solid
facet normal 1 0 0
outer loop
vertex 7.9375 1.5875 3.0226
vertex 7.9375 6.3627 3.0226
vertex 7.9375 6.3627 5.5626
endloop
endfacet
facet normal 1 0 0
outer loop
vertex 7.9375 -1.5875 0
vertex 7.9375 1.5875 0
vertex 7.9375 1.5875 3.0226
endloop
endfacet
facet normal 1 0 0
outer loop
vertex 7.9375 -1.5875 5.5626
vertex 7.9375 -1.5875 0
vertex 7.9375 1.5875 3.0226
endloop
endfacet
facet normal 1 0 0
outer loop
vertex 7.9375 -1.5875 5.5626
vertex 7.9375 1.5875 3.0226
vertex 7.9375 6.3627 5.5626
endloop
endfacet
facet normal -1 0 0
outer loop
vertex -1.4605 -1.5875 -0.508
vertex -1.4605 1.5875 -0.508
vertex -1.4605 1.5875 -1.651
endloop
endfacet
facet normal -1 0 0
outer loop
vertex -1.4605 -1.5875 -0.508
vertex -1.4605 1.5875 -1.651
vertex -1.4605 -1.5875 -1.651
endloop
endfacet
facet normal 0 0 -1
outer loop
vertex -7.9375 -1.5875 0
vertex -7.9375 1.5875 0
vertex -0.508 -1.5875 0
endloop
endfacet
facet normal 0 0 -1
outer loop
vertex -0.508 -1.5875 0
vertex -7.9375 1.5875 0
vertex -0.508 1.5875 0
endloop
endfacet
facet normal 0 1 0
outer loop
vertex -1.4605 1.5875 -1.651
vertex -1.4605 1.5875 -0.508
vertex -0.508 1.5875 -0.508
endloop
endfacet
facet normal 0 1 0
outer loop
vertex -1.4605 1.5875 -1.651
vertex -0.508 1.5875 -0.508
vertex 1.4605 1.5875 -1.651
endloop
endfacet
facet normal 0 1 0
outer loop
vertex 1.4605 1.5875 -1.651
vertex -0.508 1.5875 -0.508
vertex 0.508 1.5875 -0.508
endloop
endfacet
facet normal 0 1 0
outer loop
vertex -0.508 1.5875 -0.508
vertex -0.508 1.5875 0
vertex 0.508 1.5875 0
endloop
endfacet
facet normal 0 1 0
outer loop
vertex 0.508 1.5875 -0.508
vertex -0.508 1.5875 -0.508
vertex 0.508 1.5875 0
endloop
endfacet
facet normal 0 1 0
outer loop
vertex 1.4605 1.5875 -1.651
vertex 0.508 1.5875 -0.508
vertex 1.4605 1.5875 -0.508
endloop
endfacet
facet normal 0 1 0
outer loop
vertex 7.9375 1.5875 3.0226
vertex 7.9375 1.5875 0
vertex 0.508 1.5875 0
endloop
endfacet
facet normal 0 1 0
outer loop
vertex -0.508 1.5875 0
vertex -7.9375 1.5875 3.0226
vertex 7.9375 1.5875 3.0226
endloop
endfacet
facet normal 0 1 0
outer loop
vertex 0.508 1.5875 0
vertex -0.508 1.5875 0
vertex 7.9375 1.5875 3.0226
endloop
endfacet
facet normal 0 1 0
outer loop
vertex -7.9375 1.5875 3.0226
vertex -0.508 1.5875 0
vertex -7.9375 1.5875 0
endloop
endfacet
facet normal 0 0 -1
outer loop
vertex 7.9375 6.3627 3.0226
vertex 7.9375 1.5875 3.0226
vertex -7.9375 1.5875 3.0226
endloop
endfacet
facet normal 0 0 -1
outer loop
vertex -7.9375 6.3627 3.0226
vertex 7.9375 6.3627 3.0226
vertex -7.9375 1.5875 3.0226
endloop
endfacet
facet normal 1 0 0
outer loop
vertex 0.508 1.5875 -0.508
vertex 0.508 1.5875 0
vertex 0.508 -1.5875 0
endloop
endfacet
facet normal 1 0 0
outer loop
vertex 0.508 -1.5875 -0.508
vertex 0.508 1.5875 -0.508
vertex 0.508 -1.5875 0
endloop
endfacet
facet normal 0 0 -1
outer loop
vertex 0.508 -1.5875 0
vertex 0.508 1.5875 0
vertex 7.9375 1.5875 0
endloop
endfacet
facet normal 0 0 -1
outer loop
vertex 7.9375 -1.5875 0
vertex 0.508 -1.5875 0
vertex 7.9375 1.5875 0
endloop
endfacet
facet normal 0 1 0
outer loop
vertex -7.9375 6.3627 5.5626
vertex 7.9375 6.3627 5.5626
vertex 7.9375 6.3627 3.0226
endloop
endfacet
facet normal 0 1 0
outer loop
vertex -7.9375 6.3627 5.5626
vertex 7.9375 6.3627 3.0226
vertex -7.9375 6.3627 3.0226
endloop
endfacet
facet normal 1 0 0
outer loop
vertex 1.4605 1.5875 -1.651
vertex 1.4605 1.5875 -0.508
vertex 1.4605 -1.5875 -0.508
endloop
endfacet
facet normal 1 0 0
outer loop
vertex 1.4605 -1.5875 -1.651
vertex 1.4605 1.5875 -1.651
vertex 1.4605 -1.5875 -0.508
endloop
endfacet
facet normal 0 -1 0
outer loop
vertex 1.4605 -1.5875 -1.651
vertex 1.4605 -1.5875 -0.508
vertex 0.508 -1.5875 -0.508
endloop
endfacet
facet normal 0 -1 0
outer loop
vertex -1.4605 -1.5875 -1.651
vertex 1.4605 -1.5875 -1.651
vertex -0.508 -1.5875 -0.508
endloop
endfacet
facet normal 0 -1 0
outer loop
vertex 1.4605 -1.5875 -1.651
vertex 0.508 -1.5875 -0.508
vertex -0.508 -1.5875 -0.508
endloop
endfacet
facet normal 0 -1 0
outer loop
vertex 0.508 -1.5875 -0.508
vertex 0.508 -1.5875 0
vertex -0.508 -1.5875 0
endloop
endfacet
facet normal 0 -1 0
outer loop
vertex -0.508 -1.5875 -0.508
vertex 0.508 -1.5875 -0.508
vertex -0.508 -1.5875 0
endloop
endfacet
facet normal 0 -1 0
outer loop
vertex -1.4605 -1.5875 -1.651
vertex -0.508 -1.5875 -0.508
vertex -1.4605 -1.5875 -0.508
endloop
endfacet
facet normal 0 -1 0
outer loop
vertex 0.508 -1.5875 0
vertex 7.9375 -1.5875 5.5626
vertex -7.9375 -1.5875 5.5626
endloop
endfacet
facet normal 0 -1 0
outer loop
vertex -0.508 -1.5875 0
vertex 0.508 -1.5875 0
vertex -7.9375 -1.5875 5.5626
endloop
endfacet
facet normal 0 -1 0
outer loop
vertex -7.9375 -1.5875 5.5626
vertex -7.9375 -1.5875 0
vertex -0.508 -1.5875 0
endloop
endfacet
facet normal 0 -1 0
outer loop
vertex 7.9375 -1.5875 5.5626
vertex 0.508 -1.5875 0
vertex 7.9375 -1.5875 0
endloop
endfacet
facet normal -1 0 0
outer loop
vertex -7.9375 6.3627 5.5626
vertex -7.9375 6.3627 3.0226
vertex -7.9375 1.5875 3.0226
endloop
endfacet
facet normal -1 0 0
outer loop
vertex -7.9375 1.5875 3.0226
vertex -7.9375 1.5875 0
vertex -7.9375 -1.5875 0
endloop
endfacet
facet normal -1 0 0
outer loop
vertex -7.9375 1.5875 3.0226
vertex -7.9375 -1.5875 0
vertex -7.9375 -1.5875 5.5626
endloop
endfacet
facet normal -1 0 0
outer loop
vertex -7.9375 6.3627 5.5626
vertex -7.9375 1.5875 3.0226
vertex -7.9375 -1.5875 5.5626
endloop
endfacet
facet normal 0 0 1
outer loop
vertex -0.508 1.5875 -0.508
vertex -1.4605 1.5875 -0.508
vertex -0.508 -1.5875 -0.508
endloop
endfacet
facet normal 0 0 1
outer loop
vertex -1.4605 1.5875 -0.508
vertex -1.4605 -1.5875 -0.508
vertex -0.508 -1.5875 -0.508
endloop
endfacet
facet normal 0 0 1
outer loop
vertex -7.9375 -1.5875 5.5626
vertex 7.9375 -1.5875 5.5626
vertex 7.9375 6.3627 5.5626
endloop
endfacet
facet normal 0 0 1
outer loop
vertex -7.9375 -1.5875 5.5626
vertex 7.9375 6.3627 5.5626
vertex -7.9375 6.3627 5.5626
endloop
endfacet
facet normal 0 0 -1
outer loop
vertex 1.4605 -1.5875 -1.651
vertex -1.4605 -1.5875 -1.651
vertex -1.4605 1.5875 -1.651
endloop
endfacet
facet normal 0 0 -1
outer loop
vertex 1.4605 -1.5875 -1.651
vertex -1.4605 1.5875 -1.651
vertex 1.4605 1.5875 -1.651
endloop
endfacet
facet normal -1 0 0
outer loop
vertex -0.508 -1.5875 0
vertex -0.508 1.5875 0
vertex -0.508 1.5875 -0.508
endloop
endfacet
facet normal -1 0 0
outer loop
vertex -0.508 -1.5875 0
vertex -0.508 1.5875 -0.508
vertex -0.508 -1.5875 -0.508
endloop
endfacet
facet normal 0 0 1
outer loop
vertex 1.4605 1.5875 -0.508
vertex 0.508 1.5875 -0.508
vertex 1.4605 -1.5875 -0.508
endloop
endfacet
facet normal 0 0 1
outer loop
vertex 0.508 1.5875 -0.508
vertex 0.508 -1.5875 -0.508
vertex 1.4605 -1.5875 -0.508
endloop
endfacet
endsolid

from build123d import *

# Parameters (mm, degrees)
F0_W     = 15.875
F0_H     = 3.175
F1_DEPTH = 5.5626
F2_W     = 15.875
F2_H     = 2.54
F3_DEPTH = 4.7752
F4_W     = 1.016
F4_H     = 3.175
F5_DEPTH = 0.508
F6_W     = 0.9525
F6_H     = 3.175
F6_W_2   = 1.016
F7_DEPTH = 1.143


with BuildPart() as f1:
    # F0 (on Top) → F1 (new body)
    with BuildSketch(Plane.XY):
        Rectangle(F0_W, F0_H)
    extrude(amount=F1_DEPTH)

    # F2 (on face) → F3 (join)
    with BuildSketch(Plane(origin=(0, 1.5875, 0), x_dir=(-1, 0, 0), z_dir=(0, 1, 0))):
        with Locations((0, 4.2926)):
            Rectangle(F2_W, F2_H)
    extrude(amount=F3_DEPTH)

    # F4 (on face) → F5 (join)
    with BuildSketch(Plane(origin=(0, 0, 0), x_dir=(1, 0, 0), z_dir=(0, 0, -1))):
        Rectangle(F4_W, F4_H)
    extrude(amount=F5_DEPTH)

    # F6 (on face) → F7 (join)
    with BuildSketch(Plane(origin=(0, 0, -0.508), x_dir=(1, 0, 0), z_dir=(0, 0, -1))):
        with Locations((0.98425, 0)):
            Rectangle(F6_W, F6_H)
        Rectangle(F6_W_2, F6_H)
        with Locations((-0.98425, 0)):
            Rectangle(F6_W, F6_H)
    extrude(amount=F7_DEPTH)


solid = f1.part
